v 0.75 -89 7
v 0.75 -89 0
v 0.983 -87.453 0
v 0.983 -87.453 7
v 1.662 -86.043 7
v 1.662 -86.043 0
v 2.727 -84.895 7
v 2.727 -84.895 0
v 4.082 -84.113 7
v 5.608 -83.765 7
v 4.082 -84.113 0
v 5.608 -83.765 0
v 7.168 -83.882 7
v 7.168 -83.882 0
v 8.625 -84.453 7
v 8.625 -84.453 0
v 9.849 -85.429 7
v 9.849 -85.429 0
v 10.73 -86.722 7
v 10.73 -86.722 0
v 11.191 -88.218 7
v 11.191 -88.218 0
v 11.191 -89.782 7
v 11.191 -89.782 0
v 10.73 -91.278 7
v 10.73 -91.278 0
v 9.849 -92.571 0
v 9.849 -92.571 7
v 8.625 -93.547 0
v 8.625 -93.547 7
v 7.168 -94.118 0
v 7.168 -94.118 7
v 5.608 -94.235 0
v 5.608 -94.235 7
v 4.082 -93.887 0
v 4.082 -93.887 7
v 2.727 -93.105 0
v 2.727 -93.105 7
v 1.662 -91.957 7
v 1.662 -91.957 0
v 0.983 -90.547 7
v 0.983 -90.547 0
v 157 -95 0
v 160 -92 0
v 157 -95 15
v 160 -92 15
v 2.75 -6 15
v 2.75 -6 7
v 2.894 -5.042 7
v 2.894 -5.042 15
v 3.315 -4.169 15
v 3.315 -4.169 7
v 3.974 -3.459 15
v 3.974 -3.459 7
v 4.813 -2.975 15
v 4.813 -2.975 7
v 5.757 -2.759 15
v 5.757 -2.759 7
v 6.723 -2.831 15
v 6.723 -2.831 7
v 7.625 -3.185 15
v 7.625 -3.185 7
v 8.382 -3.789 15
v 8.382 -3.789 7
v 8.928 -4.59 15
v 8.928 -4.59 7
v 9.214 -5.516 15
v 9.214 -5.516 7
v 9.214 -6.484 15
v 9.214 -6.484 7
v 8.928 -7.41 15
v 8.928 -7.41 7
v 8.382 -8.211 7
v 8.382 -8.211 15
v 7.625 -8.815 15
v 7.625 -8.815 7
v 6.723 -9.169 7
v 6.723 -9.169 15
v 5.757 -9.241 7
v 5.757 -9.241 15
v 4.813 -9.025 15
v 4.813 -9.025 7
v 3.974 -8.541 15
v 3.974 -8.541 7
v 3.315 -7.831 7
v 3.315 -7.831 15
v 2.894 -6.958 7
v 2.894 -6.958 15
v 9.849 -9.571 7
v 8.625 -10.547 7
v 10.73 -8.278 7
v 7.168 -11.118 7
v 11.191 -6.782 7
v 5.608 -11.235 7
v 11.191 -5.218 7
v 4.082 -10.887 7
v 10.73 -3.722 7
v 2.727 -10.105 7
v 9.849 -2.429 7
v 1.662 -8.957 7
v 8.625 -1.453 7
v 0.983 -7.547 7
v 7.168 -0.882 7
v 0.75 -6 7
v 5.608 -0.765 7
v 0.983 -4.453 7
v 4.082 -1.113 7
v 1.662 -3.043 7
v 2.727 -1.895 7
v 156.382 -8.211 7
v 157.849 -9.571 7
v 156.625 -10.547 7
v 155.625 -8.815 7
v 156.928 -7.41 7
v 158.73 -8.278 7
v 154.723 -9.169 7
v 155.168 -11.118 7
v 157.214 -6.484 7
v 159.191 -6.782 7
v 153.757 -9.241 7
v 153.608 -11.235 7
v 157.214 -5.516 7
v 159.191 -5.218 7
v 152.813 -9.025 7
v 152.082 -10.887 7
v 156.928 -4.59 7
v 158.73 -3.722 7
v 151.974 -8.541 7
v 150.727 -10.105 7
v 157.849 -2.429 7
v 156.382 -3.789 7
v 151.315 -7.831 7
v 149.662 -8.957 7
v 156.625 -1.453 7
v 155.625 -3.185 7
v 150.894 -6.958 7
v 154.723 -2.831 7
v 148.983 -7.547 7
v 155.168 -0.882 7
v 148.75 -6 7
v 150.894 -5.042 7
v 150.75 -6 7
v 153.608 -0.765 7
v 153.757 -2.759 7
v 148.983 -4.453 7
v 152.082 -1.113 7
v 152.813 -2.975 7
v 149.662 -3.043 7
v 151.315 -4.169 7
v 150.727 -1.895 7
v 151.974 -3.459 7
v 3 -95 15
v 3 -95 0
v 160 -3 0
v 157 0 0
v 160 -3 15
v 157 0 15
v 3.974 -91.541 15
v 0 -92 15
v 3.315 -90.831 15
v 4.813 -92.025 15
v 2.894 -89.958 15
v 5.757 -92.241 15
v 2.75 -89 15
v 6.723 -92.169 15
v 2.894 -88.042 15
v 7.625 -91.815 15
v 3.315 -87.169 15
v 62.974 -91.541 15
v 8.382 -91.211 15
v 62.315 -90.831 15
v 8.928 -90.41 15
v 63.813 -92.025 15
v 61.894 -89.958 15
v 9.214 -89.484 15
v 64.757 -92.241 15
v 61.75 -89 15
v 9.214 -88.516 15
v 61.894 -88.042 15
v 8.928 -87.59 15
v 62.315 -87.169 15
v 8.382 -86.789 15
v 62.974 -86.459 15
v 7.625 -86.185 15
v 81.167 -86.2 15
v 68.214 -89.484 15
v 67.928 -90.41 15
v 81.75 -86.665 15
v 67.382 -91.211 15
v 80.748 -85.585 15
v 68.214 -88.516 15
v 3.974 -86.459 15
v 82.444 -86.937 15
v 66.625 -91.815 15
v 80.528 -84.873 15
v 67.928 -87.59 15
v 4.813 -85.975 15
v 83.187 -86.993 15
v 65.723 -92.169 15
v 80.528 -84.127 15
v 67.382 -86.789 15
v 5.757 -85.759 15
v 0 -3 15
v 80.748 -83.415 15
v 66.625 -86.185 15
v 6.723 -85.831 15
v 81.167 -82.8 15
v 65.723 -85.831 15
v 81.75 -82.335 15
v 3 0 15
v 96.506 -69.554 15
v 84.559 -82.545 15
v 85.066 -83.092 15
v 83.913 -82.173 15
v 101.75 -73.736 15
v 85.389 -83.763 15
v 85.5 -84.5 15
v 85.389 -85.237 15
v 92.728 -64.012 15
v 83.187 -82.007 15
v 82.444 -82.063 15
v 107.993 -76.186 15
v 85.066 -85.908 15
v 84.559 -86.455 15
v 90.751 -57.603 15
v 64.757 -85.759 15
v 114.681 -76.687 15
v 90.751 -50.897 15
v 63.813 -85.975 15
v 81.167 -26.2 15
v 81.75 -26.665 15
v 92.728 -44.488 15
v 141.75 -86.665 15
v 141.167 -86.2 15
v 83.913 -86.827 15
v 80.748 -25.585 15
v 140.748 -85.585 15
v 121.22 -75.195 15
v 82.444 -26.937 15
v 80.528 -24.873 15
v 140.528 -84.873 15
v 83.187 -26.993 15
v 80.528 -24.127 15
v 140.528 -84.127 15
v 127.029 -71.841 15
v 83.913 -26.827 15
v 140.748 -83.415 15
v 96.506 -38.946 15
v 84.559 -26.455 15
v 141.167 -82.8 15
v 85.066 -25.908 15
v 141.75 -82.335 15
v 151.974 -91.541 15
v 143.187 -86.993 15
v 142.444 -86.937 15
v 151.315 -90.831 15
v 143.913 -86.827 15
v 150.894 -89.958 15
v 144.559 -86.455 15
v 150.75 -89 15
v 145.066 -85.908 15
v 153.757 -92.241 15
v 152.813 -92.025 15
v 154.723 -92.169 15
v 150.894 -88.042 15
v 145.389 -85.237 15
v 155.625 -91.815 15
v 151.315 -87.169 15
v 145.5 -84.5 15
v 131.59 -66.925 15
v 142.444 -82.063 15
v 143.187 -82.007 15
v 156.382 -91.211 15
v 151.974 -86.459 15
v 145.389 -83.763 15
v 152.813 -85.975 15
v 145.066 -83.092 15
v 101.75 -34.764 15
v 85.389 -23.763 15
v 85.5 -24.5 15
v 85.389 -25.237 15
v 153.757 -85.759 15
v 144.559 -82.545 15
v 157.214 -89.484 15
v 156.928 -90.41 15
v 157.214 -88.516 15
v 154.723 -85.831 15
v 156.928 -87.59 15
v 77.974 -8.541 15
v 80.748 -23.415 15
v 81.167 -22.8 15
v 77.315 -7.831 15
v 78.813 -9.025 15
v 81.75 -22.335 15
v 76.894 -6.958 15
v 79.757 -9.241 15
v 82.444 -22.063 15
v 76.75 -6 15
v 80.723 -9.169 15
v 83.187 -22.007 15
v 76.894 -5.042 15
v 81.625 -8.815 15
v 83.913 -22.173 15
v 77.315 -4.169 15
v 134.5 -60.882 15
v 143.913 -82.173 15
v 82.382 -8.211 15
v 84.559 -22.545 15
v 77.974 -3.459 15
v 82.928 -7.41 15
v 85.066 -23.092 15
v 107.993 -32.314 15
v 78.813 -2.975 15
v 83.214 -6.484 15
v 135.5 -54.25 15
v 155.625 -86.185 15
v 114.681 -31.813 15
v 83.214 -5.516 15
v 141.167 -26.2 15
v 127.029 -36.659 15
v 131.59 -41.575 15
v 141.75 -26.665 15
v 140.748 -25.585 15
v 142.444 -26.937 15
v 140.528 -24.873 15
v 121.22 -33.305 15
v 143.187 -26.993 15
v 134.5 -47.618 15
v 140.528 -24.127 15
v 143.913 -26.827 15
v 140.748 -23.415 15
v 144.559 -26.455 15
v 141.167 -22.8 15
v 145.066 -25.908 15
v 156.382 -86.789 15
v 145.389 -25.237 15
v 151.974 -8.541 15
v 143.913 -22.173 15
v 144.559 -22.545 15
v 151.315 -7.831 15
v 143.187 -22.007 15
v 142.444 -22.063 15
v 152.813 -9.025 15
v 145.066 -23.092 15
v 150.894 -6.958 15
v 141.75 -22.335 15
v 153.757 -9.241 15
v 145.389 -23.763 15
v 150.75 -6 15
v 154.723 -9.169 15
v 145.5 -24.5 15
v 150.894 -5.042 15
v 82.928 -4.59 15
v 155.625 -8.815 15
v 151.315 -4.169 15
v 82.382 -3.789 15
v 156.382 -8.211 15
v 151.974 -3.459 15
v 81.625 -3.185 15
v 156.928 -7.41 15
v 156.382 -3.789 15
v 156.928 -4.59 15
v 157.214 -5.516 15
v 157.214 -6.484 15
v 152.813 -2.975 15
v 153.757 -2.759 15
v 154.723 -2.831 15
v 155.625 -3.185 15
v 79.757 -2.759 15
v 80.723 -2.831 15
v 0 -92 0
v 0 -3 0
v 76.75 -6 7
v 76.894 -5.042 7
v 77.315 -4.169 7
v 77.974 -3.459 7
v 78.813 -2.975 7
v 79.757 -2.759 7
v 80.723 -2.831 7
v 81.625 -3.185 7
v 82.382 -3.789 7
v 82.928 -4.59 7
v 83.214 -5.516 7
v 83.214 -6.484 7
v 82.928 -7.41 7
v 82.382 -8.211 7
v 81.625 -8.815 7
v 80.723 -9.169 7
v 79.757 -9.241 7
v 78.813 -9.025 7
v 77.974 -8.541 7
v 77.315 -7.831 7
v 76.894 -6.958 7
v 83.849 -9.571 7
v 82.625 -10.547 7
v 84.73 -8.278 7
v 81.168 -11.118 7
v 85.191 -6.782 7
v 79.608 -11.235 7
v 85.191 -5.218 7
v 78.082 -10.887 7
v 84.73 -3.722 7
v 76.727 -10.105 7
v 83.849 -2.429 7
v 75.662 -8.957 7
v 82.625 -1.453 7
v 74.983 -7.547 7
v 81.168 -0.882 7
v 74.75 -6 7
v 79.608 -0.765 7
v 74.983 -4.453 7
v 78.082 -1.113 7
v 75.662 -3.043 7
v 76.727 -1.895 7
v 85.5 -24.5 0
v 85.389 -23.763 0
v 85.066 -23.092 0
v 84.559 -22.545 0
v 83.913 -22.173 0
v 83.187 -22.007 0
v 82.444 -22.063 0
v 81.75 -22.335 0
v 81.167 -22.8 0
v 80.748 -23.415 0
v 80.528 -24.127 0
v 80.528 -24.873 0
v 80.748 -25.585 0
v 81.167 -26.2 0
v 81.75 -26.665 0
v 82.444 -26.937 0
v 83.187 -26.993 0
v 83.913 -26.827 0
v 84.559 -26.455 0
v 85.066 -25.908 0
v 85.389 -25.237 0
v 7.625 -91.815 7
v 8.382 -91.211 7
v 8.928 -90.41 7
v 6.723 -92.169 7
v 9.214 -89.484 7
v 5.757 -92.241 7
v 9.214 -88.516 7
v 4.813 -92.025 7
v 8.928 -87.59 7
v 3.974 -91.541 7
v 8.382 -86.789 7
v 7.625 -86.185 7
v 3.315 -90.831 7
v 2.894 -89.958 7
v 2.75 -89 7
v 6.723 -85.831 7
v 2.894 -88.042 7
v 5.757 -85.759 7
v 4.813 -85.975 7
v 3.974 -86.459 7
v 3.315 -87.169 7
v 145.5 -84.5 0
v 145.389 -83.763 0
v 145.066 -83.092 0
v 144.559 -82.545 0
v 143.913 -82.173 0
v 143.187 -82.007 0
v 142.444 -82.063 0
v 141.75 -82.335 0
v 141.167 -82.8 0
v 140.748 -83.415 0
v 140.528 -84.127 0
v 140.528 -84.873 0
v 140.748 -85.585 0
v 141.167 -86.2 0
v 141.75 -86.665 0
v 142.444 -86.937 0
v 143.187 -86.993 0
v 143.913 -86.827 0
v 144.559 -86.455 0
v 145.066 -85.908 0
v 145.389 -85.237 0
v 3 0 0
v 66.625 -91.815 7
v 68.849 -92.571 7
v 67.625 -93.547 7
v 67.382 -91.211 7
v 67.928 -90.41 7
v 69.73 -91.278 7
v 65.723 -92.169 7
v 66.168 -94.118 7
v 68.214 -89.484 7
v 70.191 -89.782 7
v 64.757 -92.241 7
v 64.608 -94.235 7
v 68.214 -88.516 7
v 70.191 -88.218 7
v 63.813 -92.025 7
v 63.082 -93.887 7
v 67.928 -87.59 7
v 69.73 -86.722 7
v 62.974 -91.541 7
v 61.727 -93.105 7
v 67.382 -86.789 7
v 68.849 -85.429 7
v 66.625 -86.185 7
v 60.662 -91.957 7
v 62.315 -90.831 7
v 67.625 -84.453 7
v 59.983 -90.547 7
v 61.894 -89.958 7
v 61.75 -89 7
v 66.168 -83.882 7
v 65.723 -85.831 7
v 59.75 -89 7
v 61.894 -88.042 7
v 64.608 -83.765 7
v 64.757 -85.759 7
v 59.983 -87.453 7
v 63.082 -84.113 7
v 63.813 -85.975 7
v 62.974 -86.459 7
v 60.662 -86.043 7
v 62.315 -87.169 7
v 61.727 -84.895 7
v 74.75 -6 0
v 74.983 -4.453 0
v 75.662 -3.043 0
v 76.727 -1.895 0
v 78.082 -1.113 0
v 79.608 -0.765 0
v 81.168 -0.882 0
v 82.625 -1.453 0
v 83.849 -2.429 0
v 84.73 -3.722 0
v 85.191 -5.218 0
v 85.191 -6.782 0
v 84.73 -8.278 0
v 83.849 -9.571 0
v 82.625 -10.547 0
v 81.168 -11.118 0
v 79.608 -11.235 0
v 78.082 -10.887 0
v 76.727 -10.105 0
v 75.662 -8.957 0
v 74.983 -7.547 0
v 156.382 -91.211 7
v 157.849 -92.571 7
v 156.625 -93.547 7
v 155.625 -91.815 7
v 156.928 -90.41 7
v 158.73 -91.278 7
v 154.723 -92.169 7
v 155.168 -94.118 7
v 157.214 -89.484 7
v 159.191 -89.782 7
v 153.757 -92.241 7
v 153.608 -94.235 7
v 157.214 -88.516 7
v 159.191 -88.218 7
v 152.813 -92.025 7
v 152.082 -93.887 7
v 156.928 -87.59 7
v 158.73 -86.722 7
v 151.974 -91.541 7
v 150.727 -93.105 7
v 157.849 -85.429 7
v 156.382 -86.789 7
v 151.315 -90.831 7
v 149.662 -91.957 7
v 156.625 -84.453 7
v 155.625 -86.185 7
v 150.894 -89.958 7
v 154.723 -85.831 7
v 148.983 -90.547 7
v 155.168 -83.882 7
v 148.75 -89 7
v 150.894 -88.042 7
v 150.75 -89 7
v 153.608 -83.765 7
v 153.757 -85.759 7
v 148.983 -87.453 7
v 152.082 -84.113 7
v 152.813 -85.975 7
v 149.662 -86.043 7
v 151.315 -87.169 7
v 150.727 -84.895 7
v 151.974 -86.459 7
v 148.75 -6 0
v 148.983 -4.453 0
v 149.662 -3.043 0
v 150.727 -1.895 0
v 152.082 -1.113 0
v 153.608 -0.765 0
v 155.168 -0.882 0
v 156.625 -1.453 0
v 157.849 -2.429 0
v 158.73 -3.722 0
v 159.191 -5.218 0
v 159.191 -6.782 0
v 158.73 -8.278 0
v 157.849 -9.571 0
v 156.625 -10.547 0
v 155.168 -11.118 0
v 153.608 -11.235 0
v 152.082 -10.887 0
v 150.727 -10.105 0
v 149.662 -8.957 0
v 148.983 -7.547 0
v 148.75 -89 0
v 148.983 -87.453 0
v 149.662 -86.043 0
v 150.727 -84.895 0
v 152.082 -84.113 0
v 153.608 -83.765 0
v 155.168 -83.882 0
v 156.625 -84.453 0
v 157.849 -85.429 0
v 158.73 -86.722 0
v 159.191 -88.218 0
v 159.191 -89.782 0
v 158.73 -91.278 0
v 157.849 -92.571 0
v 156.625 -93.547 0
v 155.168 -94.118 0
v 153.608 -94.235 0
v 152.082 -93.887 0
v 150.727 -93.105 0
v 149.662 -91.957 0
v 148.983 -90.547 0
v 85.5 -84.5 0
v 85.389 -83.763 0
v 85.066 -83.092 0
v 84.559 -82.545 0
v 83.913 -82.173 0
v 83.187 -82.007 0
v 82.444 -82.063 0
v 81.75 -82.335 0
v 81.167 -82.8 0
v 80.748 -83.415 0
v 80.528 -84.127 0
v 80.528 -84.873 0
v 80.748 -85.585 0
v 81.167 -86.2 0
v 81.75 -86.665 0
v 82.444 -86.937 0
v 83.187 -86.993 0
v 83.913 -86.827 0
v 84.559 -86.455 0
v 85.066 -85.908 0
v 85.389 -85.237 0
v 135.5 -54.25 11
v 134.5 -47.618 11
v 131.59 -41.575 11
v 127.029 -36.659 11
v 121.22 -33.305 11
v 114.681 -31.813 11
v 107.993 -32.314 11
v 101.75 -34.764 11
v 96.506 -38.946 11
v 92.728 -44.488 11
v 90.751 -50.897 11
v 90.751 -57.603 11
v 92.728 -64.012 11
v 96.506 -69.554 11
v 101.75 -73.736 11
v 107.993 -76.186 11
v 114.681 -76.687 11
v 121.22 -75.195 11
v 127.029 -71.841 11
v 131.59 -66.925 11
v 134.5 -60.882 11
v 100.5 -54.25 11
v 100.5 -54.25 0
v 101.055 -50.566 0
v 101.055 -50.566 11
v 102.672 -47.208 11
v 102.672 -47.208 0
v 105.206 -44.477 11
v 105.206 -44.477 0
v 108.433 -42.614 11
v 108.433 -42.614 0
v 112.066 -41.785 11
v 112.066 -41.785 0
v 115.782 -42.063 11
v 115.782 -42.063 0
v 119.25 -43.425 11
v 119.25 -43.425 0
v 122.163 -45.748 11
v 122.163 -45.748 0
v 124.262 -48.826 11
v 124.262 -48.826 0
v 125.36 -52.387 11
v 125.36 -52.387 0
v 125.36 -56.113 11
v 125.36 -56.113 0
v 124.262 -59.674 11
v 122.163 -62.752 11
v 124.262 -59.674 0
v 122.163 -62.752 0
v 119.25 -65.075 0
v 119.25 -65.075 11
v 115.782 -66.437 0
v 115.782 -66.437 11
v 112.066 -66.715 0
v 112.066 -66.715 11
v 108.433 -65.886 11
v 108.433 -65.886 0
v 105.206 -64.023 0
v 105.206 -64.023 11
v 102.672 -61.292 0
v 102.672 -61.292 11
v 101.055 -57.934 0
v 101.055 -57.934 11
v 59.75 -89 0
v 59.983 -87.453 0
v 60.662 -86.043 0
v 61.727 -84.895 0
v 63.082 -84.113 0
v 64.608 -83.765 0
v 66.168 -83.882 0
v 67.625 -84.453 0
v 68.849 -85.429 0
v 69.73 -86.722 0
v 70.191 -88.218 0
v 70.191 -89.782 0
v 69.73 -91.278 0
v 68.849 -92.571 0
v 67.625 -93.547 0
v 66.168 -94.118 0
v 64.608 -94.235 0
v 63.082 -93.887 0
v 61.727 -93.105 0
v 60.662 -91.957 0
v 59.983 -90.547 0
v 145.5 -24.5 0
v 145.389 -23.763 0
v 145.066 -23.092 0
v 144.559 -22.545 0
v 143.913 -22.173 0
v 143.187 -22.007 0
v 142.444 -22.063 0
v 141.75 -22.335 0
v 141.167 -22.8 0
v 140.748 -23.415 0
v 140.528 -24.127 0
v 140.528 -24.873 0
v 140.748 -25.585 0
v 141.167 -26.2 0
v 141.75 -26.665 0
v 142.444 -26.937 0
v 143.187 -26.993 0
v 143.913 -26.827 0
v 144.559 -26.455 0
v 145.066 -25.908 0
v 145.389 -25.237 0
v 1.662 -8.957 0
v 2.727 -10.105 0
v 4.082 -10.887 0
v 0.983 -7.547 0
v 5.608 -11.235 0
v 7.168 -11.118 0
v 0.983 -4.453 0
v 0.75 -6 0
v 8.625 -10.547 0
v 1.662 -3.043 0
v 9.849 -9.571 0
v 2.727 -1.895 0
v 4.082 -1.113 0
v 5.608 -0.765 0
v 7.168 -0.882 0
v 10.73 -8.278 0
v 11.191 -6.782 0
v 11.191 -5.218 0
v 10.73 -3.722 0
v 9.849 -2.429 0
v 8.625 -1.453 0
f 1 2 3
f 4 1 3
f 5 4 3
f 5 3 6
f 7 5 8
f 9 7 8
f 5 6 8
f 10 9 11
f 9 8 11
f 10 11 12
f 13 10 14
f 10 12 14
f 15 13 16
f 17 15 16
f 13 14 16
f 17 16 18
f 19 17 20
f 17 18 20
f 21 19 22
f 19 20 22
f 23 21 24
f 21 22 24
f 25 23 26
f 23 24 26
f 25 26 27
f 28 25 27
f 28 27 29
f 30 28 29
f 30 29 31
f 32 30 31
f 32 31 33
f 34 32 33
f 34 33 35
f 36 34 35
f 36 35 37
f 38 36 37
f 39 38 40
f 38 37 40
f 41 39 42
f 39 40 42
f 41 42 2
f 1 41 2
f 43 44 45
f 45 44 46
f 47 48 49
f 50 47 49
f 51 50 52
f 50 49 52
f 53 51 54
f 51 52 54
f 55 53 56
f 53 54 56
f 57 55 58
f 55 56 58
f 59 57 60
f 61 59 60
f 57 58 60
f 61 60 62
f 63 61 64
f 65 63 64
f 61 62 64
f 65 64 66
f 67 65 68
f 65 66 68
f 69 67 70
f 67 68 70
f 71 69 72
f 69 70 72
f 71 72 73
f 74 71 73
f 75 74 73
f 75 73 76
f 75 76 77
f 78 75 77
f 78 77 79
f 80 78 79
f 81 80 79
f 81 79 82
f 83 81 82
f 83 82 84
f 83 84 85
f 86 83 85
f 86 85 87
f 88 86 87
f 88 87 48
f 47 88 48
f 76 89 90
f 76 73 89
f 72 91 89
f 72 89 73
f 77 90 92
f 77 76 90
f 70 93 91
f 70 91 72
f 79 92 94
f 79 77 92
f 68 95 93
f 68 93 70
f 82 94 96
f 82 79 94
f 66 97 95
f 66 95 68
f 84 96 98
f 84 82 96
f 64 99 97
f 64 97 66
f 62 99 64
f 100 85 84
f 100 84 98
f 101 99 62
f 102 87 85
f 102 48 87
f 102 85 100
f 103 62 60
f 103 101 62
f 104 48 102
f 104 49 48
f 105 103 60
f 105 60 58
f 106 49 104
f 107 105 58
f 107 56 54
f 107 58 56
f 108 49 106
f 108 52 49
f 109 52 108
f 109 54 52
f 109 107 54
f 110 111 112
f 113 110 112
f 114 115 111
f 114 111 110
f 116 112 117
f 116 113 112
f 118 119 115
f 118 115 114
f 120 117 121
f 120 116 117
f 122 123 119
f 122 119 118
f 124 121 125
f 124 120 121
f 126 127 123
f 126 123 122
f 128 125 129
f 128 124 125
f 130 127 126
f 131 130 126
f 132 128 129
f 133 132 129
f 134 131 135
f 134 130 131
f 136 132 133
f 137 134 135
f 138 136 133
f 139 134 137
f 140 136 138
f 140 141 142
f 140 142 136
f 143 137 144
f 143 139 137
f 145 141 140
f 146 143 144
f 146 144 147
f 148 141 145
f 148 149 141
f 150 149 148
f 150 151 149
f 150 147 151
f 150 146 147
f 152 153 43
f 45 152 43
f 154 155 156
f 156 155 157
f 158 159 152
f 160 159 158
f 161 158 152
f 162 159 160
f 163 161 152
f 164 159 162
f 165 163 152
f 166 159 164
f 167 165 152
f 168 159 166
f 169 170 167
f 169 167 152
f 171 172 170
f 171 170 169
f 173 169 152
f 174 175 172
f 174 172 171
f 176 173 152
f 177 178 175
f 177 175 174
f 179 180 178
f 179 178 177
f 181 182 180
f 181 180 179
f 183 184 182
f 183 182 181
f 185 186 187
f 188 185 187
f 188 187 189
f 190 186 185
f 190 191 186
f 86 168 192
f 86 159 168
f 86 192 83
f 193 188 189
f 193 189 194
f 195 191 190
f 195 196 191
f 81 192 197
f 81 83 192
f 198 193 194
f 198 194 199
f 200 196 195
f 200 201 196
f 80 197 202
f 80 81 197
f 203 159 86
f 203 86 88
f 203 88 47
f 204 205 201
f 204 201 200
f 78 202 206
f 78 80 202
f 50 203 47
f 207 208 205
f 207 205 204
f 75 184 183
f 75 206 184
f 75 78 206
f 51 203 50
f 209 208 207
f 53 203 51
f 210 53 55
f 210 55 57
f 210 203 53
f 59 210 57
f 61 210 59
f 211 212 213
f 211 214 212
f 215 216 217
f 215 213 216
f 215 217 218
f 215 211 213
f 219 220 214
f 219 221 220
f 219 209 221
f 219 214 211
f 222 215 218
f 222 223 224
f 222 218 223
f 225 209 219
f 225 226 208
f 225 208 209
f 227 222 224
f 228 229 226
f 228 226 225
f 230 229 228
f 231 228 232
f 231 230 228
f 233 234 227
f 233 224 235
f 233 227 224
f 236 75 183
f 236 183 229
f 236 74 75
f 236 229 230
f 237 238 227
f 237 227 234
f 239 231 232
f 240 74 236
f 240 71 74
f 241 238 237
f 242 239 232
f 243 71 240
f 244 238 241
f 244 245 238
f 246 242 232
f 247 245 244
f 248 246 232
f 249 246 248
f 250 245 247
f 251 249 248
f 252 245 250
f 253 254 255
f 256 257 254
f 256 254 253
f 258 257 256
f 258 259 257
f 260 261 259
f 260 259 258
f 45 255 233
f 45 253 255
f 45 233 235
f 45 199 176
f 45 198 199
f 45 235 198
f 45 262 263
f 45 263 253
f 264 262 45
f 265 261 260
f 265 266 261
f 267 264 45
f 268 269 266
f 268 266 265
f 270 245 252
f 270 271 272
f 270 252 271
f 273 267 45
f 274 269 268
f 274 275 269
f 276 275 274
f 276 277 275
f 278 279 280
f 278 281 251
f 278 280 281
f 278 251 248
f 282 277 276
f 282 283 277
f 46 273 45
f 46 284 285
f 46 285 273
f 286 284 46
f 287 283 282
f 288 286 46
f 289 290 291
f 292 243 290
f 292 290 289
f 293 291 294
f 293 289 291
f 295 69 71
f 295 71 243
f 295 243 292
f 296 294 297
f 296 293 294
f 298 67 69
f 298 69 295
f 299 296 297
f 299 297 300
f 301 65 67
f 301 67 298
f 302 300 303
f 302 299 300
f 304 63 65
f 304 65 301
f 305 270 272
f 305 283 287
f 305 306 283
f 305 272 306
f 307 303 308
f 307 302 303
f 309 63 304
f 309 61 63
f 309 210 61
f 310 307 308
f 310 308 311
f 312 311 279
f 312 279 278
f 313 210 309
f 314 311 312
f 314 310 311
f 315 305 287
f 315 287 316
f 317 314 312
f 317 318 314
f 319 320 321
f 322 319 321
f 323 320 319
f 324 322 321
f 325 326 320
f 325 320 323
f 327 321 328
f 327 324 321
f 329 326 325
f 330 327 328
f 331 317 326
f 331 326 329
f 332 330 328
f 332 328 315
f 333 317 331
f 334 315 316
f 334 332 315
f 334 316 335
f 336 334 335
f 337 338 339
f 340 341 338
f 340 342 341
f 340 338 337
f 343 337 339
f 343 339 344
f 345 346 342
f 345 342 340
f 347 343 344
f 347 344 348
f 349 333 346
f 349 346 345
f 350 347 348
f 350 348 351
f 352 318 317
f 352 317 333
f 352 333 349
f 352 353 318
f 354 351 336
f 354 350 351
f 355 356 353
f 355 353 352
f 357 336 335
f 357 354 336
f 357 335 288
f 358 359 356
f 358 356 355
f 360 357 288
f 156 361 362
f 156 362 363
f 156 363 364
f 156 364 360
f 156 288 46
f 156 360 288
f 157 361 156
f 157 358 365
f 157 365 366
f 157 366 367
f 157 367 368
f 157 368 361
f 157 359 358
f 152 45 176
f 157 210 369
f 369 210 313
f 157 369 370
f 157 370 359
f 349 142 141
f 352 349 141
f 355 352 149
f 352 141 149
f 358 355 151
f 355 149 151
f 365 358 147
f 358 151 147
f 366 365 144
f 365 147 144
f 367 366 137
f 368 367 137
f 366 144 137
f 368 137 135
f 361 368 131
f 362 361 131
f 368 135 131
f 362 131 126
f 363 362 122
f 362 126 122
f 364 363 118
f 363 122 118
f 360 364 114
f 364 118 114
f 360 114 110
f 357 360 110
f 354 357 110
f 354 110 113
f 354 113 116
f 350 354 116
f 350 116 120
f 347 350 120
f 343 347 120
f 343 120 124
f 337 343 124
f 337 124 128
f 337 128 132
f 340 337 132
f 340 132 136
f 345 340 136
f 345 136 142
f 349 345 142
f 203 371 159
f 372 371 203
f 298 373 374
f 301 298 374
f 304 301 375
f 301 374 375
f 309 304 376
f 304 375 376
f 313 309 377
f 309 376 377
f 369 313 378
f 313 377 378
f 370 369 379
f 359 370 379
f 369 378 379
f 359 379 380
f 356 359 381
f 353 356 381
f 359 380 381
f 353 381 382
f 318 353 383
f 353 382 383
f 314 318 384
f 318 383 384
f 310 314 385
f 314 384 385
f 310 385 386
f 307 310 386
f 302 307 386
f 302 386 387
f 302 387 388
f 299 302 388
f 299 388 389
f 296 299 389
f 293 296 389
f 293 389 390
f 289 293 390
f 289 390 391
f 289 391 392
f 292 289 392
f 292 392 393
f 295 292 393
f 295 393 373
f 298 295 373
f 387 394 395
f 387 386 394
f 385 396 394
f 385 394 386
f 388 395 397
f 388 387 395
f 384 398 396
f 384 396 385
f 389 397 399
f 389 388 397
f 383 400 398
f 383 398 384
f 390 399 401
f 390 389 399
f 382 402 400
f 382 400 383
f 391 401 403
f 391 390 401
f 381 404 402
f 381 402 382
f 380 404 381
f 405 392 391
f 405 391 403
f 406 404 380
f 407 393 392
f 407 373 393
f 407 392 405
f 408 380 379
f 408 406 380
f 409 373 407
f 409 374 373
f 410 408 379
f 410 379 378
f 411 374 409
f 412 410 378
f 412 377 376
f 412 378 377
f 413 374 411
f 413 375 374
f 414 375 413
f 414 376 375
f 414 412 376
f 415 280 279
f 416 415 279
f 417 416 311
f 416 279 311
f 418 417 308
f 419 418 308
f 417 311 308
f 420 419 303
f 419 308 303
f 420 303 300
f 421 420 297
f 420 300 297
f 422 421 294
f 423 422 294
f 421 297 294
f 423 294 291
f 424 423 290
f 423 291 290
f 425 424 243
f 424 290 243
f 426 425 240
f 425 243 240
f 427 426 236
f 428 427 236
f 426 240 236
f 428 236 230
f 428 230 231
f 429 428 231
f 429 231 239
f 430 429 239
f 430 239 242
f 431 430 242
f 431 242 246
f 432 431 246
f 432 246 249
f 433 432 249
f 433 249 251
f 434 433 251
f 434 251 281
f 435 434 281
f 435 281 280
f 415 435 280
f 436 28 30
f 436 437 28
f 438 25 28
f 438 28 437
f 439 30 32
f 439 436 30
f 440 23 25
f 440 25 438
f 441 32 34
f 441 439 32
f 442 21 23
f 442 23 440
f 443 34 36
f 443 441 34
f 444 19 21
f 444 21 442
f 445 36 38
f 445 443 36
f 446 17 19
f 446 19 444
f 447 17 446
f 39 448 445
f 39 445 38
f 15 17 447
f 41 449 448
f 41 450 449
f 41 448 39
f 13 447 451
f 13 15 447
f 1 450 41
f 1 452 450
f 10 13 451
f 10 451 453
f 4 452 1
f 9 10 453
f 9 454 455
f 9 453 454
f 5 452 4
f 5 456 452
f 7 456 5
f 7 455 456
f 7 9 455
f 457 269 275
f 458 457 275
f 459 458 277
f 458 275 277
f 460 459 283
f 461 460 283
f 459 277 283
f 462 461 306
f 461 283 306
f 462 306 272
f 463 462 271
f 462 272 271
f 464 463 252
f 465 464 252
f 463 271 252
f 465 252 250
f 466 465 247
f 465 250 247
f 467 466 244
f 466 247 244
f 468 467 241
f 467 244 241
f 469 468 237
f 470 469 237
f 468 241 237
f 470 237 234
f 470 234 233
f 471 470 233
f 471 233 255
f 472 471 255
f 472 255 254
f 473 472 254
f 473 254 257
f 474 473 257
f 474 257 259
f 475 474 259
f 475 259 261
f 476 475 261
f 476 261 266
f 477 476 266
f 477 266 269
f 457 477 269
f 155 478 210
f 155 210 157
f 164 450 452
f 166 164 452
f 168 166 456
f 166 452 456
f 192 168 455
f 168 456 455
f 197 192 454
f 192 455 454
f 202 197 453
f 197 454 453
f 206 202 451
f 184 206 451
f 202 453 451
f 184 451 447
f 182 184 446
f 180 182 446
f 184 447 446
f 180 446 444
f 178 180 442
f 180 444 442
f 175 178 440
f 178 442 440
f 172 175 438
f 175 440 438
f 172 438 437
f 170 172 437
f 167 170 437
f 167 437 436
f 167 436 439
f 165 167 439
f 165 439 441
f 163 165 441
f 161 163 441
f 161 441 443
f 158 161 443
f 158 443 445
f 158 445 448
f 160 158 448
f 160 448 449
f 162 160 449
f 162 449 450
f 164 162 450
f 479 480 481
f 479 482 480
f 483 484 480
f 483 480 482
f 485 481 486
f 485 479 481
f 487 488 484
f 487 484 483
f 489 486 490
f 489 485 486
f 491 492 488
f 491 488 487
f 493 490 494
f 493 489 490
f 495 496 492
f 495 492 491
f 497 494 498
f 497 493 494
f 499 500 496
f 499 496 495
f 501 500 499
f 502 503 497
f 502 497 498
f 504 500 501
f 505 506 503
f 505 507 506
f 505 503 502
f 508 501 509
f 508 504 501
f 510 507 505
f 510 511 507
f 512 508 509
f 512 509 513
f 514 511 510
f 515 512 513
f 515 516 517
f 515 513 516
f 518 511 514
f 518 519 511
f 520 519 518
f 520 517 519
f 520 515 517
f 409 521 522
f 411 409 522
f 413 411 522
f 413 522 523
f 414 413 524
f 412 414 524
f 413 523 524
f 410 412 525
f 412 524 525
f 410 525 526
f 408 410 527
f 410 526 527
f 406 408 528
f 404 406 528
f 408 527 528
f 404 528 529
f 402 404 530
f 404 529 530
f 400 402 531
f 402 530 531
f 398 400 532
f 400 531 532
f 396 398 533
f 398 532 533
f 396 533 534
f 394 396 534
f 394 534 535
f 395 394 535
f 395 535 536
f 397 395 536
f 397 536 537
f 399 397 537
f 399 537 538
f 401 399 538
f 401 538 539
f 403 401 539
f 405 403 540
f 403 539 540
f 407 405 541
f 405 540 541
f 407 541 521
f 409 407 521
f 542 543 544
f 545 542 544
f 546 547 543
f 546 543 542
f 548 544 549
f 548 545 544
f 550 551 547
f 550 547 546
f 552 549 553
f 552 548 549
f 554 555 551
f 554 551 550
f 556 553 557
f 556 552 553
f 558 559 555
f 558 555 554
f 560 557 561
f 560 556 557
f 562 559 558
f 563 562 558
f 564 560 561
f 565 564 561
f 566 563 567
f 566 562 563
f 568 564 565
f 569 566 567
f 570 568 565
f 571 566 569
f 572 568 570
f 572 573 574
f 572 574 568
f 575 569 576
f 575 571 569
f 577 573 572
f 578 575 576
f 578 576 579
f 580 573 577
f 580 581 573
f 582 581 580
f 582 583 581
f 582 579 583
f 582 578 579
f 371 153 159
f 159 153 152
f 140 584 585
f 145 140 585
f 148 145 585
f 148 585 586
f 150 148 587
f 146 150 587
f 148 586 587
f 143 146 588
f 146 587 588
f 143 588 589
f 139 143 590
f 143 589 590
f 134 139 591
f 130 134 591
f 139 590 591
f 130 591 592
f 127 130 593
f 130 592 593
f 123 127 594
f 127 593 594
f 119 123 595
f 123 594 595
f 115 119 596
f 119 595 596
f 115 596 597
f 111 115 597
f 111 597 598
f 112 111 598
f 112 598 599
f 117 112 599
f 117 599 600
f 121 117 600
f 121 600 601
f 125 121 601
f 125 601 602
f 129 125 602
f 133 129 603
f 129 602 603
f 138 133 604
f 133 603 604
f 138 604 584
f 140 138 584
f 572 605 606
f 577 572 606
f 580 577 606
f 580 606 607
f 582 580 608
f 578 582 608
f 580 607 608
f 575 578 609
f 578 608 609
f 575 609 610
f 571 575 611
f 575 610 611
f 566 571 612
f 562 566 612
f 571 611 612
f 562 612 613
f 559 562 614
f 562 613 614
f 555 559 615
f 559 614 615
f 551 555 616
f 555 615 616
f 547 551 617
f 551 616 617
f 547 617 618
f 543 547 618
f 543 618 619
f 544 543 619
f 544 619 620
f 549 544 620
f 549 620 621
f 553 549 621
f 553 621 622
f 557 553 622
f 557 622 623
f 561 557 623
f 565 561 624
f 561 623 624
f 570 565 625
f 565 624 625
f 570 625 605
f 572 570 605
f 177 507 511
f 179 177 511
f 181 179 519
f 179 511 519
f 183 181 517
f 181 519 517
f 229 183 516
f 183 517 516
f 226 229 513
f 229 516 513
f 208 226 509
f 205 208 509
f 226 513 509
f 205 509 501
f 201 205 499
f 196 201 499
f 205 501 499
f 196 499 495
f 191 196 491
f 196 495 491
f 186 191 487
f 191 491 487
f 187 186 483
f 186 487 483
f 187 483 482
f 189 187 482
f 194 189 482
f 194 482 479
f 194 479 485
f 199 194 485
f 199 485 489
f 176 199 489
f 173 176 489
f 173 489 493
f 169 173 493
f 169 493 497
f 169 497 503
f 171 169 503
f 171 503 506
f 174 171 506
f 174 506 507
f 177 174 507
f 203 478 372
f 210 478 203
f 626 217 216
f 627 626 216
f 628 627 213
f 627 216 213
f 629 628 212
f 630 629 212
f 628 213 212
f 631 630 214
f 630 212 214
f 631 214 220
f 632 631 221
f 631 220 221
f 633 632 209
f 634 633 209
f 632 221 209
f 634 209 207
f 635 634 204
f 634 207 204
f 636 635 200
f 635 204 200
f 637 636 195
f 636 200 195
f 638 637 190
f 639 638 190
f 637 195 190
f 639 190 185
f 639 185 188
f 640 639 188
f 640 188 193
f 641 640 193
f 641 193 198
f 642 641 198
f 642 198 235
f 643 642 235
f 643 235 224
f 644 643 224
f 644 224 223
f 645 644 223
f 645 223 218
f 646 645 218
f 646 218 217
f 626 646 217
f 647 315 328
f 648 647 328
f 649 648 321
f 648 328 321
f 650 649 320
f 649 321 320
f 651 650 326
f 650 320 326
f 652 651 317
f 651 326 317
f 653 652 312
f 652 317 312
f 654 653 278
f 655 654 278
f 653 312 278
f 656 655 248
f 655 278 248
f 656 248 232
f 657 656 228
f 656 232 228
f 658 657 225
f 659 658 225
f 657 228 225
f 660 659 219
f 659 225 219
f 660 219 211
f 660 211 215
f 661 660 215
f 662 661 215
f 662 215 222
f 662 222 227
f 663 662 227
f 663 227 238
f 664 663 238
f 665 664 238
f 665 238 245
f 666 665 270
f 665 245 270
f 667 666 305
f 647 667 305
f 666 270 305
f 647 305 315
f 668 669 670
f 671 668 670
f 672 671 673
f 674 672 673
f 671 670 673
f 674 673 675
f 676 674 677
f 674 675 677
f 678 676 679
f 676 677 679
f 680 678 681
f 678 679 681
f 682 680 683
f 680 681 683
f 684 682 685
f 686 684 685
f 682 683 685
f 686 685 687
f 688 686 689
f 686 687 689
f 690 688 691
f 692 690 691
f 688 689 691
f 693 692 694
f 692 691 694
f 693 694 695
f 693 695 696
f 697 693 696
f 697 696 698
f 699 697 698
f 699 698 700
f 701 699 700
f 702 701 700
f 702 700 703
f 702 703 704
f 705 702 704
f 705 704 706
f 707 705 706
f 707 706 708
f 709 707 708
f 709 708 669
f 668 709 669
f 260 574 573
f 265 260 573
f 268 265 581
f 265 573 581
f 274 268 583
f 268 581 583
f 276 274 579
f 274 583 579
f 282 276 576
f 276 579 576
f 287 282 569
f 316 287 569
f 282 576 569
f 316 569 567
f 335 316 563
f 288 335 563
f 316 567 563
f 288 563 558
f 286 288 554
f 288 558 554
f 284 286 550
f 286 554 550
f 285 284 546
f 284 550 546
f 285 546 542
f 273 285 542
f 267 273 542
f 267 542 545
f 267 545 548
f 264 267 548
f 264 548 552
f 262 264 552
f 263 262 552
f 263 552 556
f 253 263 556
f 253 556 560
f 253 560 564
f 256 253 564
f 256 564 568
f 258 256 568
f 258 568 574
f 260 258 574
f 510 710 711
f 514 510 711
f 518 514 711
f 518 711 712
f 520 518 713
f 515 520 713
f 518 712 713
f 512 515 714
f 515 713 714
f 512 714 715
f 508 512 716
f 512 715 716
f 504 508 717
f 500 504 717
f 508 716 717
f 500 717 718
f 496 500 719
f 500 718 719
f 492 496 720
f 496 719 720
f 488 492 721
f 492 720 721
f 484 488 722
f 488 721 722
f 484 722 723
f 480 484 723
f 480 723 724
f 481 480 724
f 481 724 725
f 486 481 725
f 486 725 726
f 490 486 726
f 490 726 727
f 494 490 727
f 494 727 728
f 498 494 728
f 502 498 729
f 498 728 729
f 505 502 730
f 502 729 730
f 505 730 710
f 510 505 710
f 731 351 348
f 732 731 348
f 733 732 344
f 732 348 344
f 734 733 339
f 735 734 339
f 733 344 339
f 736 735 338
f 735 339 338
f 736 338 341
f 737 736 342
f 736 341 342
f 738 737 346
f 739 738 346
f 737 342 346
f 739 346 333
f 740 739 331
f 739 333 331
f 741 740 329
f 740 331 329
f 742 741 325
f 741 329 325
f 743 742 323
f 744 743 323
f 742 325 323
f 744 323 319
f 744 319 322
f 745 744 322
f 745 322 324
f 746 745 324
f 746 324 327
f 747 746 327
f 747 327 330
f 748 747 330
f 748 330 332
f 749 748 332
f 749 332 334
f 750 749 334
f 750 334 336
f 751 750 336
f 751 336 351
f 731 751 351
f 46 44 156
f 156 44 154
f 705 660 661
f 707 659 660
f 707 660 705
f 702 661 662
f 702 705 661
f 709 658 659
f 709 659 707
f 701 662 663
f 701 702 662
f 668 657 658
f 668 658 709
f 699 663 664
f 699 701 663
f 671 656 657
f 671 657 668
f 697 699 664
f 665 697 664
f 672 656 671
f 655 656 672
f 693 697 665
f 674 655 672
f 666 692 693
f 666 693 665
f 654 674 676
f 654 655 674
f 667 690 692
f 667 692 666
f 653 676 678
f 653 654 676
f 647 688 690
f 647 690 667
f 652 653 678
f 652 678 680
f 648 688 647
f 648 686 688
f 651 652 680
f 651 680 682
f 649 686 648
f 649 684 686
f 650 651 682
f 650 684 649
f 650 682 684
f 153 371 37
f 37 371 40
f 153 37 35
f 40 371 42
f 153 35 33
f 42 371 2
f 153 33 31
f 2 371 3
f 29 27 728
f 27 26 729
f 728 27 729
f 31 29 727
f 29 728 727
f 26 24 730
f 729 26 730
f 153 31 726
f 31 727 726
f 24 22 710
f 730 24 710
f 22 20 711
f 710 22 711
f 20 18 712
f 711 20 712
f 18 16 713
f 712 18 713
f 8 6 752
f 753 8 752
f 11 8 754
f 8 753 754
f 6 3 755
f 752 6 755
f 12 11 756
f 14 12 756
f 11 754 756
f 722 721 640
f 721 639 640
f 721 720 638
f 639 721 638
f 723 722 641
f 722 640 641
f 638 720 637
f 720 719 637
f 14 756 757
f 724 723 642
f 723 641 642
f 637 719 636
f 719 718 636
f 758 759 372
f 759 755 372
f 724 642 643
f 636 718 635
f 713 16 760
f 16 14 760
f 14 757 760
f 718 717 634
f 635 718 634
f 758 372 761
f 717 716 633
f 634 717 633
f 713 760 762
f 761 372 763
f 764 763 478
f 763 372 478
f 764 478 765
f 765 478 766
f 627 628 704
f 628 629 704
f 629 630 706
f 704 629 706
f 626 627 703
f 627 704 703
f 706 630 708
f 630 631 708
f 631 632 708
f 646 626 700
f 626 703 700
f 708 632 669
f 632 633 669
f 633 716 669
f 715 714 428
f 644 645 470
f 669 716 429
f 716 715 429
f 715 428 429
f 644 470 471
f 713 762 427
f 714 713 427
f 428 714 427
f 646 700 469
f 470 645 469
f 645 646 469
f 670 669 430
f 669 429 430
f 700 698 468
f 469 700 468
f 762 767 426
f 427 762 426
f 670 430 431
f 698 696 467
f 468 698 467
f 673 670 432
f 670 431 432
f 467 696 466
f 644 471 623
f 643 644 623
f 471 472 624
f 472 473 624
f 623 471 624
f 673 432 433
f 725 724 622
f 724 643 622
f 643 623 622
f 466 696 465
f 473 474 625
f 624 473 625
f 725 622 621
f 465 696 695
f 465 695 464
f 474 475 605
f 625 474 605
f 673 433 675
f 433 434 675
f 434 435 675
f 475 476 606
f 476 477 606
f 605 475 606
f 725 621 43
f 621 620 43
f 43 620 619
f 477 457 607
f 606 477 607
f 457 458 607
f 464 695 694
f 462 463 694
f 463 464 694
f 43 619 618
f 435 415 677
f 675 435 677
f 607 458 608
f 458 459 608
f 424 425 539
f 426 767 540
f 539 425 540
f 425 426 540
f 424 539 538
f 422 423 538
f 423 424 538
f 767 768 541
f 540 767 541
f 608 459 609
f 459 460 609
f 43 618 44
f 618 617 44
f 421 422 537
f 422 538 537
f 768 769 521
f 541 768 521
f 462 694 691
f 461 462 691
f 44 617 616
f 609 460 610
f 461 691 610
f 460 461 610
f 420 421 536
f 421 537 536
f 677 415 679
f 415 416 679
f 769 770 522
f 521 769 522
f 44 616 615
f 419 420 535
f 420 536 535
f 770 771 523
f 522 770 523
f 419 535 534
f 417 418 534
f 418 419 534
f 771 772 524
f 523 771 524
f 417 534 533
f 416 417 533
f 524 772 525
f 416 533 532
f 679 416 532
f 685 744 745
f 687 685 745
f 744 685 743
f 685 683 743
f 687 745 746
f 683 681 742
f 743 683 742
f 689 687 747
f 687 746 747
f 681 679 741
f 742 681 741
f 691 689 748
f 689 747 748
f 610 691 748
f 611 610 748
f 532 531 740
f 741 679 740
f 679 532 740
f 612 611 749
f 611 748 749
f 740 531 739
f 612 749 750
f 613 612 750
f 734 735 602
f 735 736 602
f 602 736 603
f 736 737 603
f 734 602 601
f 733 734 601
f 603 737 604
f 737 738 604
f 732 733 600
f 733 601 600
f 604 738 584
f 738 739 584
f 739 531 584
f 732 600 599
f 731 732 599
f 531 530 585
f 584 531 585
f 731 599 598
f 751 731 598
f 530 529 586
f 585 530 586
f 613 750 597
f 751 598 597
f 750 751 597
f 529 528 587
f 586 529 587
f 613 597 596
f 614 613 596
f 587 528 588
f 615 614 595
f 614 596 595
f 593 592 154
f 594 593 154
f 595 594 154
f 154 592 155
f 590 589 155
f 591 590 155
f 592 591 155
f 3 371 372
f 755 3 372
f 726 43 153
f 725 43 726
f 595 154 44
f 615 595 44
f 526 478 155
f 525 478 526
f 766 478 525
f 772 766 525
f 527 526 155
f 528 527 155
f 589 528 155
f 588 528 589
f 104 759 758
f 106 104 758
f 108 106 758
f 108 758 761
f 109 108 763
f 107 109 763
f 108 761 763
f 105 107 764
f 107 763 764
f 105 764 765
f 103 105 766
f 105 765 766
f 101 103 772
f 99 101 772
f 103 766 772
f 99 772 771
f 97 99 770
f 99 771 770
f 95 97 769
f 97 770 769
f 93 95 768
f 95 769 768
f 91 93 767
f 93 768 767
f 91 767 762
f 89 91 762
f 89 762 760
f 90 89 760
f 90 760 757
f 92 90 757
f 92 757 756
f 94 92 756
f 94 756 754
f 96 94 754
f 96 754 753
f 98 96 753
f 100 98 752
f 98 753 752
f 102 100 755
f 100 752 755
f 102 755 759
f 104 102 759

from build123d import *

# Parameters (mm, degrees)
SKETCH_1_W             = 160
SKETCH_1_H             = 95
EXTRUDE_1_DEPTH        = 15
CHAMFER_1_SIZE         = 3
SKETCH_2_R             = 12.5
CUT_EXTRUDE_1_DEPTH    = 16
HOLE_WIZARD_M6_1_D     = 5
HOLE_WIZARD_M6_1_DEPTH = 20
HOLE_WIZARD_M6_1_TIP   = 1.502151548
SKETCH_6_R             = 5.25
CUT_EXTRUDE_2_DEPTH    = 7
SKETCH_7_R             = 3.25
CUT_EXTRUDE_3_DEPTH    = 9
SKETCH_8_R             = 22.5
CUT_EXTRUDE_4_DEPTH    = 4


with BuildPart() as part:
    # 草图1 → 凸台-拉伸1 (new body)
    with BuildSketch(Plane.XY):
        with Locations((80, -47.5)):
            Rectangle(SKETCH_1_W, SKETCH_1_H)
    extrude(amount=EXTRUDE_1_DEPTH)

    # 倒角1
    chamfer_1_edges = [part.edges().sort_by_distance(p)[0] for p in [
        (0, 0, 7.5),
        (160, 0, 7.5),
        (160, -95, 7.5),
        (0, -95, 7.5),
    ]]
    chamfer(chamfer_1_edges, length=CHAMFER_1_SIZE)

    # 草图2 → 切除-拉伸1 (cut, through all)
    with BuildSketch(Plane(origin=(0, 0, 0), x_dir=(-1, 0, 0), z_dir=(0, 0, -1))):
        with Locations((-113, -54.25)):
            Circle(SKETCH_2_R)
    extrude(amount=-CUT_EXTRUDE_1_DEPTH, mode=Mode.SUBTRACT)

    # M6 螺纹孔1
    with Locations(Plane(origin=(0, 0, 0), x_dir=(-1, 0, 0), z_dir=(0, 0, -1))):
        with Locations((-143, -24.5), (-83, -24.5), (-83, -84.5), (-143, -84.5)):
            Hole(HOLE_WIZARD_M6_1_D / 2, depth=HOLE_WIZARD_M6_1_DEPTH)
            with Locations((0, 0, -(HOLE_WIZARD_M6_1_DEPTH + HOLE_WIZARD_M6_1_TIP / 2))):  # 118° drill point
                Cone(0, HOLE_WIZARD_M6_1_D / 2, HOLE_WIZARD_M6_1_TIP, mode=Mode.SUBTRACT)

    # 草图6 → 切除-拉伸2 (cut)
    with BuildSketch(Plane(origin=(0, 0, 0), x_dir=(-1, 0, 0), z_dir=(0, 0, -1))):
        with Locations((-154, -6)):
            Circle(SKETCH_6_R)
        with Locations((-80, -6)):
            Circle(SKETCH_6_R)
        with Locations((-6, -6)):
            Circle(SKETCH_6_R)
        with Locations((-6, -89)):
            Circle(SKETCH_6_R)
        with Locations((-154, -89)):
            Circle(SKETCH_6_R)
        with Locations((-65, -89)):
            Circle(SKETCH_6_R)
    extrude(amount=-CUT_EXTRUDE_2_DEPTH, mode=Mode.SUBTRACT)

    # 草图7 → 切除-拉伸3 (cut, through all)
    with BuildSketch(Plane(origin=(0, 0, 7), x_dir=(-1, 0, 0), z_dir=(0, 0, -1))):
        with Locations((-154, -6)):
            Circle(SKETCH_7_R)
        with Locations((-80, -6)):
            Circle(SKETCH_7_R)
        with Locations((-6, -6)):
            Circle(SKETCH_7_R)
        with Locations((-6, -89)):
            Circle(SKETCH_7_R)
        with Locations((-154, -89)):
            Circle(SKETCH_7_R)
        with Locations((-65, -89)):
            Circle(SKETCH_7_R)
    extrude(amount=-CUT_EXTRUDE_3_DEPTH, mode=Mode.SUBTRACT)

    # 草图8 → 切除-拉伸4 (cut)
    with BuildSketch(Plane.XY.offset(15)):
        with Locations((113, -54.25)):
            Circle(SKETCH_8_R)
    extrude(amount=-CUT_EXTRUDE_4_DEPTH, mode=Mode.SUBTRACT)


solid = part.part
